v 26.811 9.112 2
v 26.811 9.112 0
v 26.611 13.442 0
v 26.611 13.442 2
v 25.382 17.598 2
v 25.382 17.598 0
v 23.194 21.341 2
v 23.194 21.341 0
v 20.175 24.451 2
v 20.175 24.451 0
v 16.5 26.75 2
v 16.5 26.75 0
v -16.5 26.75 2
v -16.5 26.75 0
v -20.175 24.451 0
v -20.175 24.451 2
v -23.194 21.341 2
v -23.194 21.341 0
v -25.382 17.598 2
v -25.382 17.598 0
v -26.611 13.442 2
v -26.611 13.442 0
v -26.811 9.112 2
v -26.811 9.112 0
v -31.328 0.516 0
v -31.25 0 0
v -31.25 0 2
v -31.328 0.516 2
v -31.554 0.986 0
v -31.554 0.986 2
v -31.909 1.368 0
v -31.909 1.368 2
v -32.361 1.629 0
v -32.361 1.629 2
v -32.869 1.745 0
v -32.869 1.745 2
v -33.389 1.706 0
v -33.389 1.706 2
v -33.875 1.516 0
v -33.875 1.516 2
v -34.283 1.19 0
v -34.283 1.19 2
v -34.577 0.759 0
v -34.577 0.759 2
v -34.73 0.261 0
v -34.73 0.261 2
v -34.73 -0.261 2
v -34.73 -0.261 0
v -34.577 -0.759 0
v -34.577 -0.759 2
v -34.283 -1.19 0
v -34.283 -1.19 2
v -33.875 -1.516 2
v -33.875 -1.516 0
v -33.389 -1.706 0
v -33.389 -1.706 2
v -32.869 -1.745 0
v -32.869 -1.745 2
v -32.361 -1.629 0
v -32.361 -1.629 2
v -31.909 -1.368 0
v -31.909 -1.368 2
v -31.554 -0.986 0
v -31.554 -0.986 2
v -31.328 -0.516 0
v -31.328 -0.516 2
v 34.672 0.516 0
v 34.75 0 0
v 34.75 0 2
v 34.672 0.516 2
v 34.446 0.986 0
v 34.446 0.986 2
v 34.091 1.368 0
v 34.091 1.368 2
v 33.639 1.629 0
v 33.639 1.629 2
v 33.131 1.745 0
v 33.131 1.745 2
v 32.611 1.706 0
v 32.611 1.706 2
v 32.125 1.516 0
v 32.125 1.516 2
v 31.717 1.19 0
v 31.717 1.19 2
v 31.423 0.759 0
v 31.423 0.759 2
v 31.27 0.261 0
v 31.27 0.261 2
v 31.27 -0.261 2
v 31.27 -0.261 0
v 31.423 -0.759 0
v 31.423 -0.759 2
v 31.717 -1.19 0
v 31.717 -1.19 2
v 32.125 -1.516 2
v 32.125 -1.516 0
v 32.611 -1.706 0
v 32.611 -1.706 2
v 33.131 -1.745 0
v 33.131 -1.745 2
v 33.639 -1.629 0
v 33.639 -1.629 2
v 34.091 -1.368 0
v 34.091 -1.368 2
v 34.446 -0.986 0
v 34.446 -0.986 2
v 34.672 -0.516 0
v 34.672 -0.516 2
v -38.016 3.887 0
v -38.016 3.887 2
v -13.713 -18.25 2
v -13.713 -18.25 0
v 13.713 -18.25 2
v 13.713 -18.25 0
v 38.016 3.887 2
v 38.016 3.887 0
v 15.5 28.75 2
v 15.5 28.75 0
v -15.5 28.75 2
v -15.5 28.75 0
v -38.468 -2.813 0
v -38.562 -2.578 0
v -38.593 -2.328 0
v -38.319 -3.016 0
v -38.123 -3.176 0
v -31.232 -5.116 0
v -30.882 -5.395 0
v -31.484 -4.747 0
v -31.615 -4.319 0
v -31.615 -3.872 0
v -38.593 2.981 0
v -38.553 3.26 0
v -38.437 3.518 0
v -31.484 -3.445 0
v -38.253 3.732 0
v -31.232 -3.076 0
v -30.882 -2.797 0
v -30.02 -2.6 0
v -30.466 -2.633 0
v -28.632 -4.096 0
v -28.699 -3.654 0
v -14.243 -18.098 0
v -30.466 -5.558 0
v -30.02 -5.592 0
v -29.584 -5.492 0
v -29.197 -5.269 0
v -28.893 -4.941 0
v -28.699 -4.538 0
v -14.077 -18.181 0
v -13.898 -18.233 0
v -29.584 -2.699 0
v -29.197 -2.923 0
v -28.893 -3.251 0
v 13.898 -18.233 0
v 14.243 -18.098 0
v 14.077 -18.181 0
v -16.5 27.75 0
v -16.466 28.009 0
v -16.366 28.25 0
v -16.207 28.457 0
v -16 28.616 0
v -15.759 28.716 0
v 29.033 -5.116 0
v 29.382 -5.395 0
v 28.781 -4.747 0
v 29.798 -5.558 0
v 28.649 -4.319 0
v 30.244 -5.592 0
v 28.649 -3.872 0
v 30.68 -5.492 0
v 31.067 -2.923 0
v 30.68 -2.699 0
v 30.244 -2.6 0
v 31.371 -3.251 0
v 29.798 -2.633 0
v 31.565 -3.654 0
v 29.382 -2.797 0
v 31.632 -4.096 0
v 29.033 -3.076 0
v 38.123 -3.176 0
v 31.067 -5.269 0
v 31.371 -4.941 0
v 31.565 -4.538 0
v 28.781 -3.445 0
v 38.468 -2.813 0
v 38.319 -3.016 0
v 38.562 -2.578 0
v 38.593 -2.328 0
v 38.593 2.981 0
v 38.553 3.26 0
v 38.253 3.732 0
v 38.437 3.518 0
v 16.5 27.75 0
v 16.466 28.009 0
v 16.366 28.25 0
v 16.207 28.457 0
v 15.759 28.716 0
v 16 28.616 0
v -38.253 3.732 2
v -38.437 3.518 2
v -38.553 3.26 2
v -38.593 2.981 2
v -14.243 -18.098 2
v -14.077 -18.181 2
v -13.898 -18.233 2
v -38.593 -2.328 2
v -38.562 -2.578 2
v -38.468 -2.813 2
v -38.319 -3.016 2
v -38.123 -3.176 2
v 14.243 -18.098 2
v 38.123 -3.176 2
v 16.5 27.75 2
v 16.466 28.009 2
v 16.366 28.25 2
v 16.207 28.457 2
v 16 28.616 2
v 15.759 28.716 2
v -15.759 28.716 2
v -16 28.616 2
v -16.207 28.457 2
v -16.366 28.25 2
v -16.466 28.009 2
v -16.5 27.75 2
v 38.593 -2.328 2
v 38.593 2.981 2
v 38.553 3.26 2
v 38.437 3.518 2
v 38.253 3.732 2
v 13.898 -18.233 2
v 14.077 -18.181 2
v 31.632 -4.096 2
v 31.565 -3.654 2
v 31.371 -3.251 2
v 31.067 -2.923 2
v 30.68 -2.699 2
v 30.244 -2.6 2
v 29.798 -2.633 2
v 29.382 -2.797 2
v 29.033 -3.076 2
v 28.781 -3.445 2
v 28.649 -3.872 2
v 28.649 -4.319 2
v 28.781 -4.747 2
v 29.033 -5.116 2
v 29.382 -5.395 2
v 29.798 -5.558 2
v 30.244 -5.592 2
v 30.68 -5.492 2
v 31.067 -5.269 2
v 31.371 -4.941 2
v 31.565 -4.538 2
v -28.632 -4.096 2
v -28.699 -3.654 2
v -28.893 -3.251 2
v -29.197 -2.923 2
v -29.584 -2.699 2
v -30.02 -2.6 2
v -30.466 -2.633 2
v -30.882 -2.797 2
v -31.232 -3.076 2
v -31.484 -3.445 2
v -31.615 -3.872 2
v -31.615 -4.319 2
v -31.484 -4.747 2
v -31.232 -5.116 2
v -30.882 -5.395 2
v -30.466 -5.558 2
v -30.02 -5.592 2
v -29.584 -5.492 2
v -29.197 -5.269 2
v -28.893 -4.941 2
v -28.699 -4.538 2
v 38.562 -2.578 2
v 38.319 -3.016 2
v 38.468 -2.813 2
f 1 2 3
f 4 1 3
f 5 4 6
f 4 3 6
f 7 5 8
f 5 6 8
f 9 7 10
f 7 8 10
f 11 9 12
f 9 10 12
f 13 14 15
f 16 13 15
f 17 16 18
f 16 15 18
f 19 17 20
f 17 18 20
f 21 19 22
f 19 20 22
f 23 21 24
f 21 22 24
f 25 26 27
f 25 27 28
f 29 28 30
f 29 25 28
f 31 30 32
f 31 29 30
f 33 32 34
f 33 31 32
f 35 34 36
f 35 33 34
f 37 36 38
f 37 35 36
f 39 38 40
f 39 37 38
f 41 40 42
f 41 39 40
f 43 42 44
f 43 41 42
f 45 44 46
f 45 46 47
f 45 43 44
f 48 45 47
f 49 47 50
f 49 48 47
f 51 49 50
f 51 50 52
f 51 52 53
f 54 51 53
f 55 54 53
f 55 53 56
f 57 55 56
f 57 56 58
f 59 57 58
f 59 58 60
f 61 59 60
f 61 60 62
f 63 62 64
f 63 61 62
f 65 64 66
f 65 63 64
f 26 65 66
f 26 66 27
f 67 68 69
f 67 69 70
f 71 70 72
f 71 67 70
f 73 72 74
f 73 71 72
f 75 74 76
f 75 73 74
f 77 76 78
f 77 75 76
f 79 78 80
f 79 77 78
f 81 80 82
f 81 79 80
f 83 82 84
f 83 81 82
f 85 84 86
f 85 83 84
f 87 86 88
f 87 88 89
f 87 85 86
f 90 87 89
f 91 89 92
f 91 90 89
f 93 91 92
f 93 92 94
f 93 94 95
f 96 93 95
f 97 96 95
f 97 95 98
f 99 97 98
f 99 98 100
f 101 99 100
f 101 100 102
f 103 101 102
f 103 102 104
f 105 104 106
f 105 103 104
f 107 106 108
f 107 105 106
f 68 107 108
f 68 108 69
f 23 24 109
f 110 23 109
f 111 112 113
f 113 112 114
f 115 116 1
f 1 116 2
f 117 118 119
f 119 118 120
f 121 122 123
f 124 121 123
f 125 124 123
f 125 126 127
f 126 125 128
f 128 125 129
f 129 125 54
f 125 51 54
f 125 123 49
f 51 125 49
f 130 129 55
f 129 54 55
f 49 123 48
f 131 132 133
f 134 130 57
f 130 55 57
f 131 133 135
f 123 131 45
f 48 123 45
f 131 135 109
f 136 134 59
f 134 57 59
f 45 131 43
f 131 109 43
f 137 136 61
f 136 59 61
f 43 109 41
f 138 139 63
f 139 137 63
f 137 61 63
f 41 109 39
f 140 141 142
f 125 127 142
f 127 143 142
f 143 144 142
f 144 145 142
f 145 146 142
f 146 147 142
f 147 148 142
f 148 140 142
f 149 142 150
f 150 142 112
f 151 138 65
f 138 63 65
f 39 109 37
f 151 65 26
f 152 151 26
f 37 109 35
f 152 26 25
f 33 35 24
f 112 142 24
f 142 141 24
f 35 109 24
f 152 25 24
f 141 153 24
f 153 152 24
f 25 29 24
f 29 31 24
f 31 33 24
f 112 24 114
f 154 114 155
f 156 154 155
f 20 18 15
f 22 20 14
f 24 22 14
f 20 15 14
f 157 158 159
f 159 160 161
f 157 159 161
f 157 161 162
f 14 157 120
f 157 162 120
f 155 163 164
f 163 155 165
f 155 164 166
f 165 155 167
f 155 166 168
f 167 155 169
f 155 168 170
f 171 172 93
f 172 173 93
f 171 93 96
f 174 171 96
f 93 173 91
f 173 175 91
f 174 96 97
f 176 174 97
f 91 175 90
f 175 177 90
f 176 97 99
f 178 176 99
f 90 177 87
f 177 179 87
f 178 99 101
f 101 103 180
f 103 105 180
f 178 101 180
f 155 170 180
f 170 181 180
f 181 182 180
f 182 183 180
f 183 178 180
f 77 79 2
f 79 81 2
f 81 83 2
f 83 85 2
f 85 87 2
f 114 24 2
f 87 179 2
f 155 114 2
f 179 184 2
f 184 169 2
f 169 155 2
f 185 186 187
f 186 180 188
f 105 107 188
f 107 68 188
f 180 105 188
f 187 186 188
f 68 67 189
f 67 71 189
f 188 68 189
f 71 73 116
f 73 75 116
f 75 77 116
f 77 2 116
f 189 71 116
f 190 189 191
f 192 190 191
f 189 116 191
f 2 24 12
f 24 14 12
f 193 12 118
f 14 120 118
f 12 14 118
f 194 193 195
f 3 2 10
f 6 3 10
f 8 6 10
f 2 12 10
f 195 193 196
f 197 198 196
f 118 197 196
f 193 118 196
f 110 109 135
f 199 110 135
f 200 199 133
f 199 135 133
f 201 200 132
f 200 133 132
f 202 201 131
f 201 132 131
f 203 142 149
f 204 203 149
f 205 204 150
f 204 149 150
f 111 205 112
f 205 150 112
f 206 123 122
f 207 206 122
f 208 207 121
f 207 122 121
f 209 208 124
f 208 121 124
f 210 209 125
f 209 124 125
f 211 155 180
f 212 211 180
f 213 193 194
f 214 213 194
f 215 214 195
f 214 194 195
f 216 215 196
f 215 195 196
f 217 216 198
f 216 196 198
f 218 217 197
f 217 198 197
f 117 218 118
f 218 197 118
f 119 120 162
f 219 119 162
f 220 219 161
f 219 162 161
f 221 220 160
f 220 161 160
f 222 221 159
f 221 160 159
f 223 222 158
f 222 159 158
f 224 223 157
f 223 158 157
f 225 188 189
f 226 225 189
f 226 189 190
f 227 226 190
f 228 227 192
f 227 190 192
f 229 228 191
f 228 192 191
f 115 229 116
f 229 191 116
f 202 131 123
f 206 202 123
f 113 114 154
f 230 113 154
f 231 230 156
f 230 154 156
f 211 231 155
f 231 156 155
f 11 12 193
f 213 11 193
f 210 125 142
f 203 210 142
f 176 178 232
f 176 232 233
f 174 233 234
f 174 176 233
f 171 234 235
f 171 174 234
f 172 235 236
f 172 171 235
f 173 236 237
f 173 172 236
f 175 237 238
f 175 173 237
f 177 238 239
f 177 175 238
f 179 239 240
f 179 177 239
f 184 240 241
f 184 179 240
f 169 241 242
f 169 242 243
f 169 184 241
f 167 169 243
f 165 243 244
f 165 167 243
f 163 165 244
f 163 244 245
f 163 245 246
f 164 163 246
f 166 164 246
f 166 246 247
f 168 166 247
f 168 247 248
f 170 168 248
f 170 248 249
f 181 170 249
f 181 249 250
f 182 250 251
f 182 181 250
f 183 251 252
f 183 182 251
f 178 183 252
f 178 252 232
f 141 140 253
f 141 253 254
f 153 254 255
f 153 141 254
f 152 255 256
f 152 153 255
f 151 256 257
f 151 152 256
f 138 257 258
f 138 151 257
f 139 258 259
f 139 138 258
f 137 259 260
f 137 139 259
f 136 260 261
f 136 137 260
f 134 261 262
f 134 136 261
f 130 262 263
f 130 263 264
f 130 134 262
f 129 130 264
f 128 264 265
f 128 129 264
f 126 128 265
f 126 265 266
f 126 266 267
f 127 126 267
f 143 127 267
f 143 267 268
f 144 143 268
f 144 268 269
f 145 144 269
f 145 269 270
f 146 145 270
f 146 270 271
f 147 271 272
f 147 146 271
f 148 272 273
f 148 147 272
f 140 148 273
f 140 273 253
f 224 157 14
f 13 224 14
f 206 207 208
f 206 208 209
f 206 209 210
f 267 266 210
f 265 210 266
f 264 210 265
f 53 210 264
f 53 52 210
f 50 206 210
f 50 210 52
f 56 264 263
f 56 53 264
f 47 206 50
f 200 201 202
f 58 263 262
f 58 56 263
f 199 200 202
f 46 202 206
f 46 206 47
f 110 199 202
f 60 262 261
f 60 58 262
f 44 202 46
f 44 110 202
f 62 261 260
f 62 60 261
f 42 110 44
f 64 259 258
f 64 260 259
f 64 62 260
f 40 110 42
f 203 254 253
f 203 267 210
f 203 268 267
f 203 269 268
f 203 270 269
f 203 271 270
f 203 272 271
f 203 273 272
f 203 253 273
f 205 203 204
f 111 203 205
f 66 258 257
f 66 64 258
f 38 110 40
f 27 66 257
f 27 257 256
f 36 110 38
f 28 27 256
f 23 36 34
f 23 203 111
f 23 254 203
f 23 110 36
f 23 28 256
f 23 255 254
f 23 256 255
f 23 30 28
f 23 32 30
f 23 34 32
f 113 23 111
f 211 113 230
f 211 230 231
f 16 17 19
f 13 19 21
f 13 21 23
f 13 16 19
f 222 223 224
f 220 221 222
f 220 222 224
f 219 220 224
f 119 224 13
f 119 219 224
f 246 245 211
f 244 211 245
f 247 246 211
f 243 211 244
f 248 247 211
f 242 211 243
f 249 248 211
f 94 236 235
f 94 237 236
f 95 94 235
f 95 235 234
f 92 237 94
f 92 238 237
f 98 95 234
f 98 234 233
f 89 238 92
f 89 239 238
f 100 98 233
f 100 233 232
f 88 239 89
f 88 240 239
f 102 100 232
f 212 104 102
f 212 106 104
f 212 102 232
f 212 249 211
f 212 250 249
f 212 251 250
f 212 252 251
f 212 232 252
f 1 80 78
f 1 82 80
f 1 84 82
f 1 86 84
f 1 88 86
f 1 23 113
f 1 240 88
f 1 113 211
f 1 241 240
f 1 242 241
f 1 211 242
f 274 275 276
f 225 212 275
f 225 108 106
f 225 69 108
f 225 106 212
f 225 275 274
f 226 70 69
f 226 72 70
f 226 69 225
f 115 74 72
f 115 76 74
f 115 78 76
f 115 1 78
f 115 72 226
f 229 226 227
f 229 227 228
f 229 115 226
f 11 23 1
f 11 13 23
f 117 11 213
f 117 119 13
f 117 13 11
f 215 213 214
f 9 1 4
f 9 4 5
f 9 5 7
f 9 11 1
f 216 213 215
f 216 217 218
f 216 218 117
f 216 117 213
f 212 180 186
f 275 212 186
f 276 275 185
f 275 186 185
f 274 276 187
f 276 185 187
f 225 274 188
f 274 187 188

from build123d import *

# Parameters (mm, degrees)
F0_R     = 1.5
F0_R_2   = 1.75
F1_DEPTH = 2


# Not quite as in the source:
# - a feature names something its author has since deleted; it is built from what else it names


with BuildPart() as f1:
    # F0 (on Top) → F1 (new body)
    with BuildSketch(Plane.XY):
        with BuildLine():
            Line((15.5, 28.75), (0, 28.75))
            Line((0, 28.75), (-15.5, 28.75))
            ThreePointArc((-15.5, 28.75), (-16.2071067812, 28.4571067812), (-16.5, 27.75))
            Line((-16.5, 27.75), (-16.5, 26.75))
            ThreePointArc((-16.5, 26.75), (-24.4007355432, 19.5356040873), (-26.8113935571, 9.1116960654))
            Line((-26.8113935571, 9.1116960654), (-38.0160130503, 3.886896189))
            ThreePointArc((-38.0160130503, 3.886896189), (-38.4367862343, 3.5178880103), (-38.5933947885, 2.980588402))
            Line((-38.5933947885, 2.980588402), (-38.5933947885, -2.3280322858))
            ThreePointArc((-38.5933947885, -2.3280322858), (-38.4680144957, -2.812841906), (-38.1233140528, -3.1760803819))
            Line((-38.1233140528, -3.1760803819), (-14.2431738785, -18.0980480962))
            ThreePointArc((-14.2431738785, -18.0980480962), (-13.9888919701, -18.2112616959), (-13.7132546142, -18.25))
            Line((-13.7132546142, -18.25), (0, -18.25))
            Line((0, -18.25), (13.7132546142, -18.25))
            ThreePointArc((13.7132546142, -18.25), (13.9888919701, -18.2112616959), (14.2431738785, -18.0980480962))
            Line((14.2431738785, -18.0980480962), (38.1233140528, -3.1760803819))
            ThreePointArc((38.1233140528, -3.1760803819), (38.4680144957, -2.812841906), (38.5933947885, -2.3280322858))
            Line((38.5933947885, -2.3280322858), (38.5933947885, 2.980588402))
            ThreePointArc((38.5933947885, 2.980588402), (38.4367862343, 3.5178880103), (38.0160130503, 3.886896189))
            Line((38.0160130503, 3.886896189), (26.8113935571, 9.1116960654))
            ThreePointArc((26.8113935571, 9.1116960654), (24.4007355432, 19.5356040873), (16.5, 26.75))
            Line((16.5, 26.75), (16.5, 27.75))
            ThreePointArc((16.5, 27.75), (16.2071067812, 28.4571067812), (15.5, 28.75))
        make_face()
        with Locations((-30.1321178182, -4.0957602214)):
            Circle(F0_R, mode=Mode.SUBTRACT)
        with Locations((-33, 0)):
            Circle(F0_R_2, mode=Mode.SUBTRACT)
        with Locations((30.1321178182, -4.0957602214)):
            Circle(F0_R, mode=Mode.SUBTRACT)
        with Locations((33, 0)):
            Circle(F0_R_2, mode=Mode.SUBTRACT)
    extrude(amount=F1_DEPTH)


solid = f1.part
